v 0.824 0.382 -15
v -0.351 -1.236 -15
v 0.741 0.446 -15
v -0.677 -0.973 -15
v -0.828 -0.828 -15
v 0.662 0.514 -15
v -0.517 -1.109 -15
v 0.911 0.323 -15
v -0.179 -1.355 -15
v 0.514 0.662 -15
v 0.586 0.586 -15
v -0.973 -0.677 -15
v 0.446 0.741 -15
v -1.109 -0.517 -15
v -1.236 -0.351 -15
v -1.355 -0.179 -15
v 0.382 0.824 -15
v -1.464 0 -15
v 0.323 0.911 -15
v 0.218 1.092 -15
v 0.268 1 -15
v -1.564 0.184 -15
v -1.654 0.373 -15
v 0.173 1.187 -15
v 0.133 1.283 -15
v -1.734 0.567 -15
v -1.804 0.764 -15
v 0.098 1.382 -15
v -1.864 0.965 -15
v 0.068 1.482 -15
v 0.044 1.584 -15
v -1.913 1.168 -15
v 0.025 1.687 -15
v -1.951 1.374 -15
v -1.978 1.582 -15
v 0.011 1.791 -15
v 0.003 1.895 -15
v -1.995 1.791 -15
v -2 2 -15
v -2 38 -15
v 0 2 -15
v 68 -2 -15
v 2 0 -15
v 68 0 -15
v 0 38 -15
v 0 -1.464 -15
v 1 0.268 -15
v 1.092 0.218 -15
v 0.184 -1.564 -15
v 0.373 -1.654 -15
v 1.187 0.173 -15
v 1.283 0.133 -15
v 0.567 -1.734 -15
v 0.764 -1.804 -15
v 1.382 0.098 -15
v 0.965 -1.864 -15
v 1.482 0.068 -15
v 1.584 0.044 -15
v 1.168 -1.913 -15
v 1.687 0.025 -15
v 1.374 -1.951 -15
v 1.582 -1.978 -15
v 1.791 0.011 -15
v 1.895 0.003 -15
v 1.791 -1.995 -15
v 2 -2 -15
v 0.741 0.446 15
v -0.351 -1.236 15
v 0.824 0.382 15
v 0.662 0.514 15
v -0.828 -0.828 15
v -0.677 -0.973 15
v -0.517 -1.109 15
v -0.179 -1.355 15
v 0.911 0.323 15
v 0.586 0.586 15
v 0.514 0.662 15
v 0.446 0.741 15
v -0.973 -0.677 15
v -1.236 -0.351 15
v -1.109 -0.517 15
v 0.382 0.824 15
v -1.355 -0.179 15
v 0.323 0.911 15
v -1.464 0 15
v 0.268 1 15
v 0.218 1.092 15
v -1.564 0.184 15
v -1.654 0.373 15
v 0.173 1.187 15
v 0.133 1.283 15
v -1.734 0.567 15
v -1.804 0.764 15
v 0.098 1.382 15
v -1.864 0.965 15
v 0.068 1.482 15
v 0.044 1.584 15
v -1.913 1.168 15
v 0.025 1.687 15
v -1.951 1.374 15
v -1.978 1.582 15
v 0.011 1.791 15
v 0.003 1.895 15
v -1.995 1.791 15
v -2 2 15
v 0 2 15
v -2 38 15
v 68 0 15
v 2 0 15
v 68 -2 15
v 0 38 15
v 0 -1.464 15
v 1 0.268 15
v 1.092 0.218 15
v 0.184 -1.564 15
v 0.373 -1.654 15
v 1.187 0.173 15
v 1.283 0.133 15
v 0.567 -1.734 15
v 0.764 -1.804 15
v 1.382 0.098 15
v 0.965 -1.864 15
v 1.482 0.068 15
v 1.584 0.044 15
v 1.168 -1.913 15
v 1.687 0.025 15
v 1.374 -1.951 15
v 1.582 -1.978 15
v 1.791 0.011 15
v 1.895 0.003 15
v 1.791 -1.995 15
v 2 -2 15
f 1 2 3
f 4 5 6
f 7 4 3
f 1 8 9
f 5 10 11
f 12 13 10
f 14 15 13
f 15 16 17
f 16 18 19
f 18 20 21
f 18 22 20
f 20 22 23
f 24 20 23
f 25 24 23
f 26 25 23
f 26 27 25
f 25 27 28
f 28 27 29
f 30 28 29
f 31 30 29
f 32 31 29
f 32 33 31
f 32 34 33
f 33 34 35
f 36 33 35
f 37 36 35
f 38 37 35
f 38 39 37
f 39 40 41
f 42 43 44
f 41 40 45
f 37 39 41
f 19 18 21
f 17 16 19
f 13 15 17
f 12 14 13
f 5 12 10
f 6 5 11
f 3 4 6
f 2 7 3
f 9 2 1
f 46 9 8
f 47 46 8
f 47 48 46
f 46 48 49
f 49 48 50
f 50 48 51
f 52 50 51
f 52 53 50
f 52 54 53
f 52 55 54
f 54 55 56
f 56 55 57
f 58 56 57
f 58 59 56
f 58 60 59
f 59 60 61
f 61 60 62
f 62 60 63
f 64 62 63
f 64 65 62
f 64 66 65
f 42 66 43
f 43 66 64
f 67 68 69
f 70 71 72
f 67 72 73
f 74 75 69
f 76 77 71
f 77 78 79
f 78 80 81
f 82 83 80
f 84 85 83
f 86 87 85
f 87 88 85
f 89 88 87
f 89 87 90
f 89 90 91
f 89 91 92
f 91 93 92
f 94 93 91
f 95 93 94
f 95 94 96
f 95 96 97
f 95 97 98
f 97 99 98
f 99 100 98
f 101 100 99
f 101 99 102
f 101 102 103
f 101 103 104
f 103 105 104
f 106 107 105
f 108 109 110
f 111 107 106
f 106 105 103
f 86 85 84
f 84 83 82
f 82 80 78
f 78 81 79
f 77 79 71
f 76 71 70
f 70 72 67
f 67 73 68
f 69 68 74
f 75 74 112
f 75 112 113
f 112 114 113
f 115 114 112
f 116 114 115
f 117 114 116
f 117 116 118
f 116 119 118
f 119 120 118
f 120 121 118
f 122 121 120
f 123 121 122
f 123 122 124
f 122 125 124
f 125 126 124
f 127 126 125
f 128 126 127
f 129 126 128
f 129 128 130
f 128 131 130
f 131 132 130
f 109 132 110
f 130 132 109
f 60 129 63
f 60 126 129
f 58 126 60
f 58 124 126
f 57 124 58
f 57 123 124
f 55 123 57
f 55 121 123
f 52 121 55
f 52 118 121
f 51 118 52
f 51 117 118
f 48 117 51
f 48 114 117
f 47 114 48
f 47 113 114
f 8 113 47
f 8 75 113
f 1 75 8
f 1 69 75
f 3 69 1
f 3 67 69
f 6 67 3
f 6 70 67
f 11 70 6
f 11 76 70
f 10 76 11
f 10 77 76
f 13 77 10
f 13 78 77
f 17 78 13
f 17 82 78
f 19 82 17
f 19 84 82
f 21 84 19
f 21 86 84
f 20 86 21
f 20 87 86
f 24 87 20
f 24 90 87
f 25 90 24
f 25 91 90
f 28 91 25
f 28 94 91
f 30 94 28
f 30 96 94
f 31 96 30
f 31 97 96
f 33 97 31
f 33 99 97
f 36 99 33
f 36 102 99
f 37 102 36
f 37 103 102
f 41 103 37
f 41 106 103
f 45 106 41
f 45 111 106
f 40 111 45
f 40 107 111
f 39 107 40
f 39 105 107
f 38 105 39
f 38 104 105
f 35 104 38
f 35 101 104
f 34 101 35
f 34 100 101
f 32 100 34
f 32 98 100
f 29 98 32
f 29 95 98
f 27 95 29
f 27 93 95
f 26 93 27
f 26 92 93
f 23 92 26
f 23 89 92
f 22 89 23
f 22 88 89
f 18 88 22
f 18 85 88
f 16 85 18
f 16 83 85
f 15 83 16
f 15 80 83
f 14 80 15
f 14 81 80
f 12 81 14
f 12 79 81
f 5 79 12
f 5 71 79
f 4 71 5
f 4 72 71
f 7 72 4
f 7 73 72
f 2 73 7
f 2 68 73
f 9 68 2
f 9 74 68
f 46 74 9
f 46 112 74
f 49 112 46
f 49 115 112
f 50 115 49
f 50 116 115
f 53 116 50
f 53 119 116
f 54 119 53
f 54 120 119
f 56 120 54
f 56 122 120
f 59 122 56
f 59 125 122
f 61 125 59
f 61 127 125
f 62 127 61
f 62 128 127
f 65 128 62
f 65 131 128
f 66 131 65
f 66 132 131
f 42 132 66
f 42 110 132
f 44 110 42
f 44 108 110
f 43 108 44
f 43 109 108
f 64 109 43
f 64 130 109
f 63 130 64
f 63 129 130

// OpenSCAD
// OpenSCAD L-bracket Sheet Metal Model
// Developed by Senior DFM Engineer

thickness_mm = 2.0;
bend_radius_mm = 2.0;
outside_length_1 = 70.0;
outside_length_2 = 40.0;
width_mm = 30.0;
K_factor = 0.45;

PI = 3.141592653589793;

// Straight flat sections
a = outside_length_1 - (bend_radius_mm + thickness_mm);
b = outside_length_2 - (bend_radius_mm + thickness_mm);

// Bend Allowance for 90-degree bend (pi/2 radians)
BA = (PI / 2) * (bend_radius_mm + K_factor * thickness_mm);
flat_length_mm = a + b + BA;

// Manifest output
echo(str("MAKERBENCH-SHEETMETAL: {\"thickness_mm\": ", thickness_mm, ", \"bend_radius_mm\": ", bend_radius_mm, ", \"flat_length_mm\": ", flat_length_mm, "}"));

module bracket_profile(L1, L2, T, Ri) {
    // Horizontal straight flange
    translate([Ri, -T])
        square([L1 - T - Ri, T]);
    
    // Vertical straight flange
    translate([-T, Ri])
        square([T, L2 - T - Ri]);
    
    // 90-degree corner bend
    difference() {
        intersection() {
            translate([Ri, Ri])
                circle(r = Ri + T, $fn = 120);
            translate([-T, -T])
                square([Ri + T, Ri + T]);
        }
        translate([Ri, Ri])
            circle(r = Ri, $fn = 120);
    }
}

// 3D Solid Extrusion
linear_extrude(height = width_mm, center = true) {
    bracket_profile(outside_length_1, outside_length_2, thickness_mm, bend_radius_mm);
}
